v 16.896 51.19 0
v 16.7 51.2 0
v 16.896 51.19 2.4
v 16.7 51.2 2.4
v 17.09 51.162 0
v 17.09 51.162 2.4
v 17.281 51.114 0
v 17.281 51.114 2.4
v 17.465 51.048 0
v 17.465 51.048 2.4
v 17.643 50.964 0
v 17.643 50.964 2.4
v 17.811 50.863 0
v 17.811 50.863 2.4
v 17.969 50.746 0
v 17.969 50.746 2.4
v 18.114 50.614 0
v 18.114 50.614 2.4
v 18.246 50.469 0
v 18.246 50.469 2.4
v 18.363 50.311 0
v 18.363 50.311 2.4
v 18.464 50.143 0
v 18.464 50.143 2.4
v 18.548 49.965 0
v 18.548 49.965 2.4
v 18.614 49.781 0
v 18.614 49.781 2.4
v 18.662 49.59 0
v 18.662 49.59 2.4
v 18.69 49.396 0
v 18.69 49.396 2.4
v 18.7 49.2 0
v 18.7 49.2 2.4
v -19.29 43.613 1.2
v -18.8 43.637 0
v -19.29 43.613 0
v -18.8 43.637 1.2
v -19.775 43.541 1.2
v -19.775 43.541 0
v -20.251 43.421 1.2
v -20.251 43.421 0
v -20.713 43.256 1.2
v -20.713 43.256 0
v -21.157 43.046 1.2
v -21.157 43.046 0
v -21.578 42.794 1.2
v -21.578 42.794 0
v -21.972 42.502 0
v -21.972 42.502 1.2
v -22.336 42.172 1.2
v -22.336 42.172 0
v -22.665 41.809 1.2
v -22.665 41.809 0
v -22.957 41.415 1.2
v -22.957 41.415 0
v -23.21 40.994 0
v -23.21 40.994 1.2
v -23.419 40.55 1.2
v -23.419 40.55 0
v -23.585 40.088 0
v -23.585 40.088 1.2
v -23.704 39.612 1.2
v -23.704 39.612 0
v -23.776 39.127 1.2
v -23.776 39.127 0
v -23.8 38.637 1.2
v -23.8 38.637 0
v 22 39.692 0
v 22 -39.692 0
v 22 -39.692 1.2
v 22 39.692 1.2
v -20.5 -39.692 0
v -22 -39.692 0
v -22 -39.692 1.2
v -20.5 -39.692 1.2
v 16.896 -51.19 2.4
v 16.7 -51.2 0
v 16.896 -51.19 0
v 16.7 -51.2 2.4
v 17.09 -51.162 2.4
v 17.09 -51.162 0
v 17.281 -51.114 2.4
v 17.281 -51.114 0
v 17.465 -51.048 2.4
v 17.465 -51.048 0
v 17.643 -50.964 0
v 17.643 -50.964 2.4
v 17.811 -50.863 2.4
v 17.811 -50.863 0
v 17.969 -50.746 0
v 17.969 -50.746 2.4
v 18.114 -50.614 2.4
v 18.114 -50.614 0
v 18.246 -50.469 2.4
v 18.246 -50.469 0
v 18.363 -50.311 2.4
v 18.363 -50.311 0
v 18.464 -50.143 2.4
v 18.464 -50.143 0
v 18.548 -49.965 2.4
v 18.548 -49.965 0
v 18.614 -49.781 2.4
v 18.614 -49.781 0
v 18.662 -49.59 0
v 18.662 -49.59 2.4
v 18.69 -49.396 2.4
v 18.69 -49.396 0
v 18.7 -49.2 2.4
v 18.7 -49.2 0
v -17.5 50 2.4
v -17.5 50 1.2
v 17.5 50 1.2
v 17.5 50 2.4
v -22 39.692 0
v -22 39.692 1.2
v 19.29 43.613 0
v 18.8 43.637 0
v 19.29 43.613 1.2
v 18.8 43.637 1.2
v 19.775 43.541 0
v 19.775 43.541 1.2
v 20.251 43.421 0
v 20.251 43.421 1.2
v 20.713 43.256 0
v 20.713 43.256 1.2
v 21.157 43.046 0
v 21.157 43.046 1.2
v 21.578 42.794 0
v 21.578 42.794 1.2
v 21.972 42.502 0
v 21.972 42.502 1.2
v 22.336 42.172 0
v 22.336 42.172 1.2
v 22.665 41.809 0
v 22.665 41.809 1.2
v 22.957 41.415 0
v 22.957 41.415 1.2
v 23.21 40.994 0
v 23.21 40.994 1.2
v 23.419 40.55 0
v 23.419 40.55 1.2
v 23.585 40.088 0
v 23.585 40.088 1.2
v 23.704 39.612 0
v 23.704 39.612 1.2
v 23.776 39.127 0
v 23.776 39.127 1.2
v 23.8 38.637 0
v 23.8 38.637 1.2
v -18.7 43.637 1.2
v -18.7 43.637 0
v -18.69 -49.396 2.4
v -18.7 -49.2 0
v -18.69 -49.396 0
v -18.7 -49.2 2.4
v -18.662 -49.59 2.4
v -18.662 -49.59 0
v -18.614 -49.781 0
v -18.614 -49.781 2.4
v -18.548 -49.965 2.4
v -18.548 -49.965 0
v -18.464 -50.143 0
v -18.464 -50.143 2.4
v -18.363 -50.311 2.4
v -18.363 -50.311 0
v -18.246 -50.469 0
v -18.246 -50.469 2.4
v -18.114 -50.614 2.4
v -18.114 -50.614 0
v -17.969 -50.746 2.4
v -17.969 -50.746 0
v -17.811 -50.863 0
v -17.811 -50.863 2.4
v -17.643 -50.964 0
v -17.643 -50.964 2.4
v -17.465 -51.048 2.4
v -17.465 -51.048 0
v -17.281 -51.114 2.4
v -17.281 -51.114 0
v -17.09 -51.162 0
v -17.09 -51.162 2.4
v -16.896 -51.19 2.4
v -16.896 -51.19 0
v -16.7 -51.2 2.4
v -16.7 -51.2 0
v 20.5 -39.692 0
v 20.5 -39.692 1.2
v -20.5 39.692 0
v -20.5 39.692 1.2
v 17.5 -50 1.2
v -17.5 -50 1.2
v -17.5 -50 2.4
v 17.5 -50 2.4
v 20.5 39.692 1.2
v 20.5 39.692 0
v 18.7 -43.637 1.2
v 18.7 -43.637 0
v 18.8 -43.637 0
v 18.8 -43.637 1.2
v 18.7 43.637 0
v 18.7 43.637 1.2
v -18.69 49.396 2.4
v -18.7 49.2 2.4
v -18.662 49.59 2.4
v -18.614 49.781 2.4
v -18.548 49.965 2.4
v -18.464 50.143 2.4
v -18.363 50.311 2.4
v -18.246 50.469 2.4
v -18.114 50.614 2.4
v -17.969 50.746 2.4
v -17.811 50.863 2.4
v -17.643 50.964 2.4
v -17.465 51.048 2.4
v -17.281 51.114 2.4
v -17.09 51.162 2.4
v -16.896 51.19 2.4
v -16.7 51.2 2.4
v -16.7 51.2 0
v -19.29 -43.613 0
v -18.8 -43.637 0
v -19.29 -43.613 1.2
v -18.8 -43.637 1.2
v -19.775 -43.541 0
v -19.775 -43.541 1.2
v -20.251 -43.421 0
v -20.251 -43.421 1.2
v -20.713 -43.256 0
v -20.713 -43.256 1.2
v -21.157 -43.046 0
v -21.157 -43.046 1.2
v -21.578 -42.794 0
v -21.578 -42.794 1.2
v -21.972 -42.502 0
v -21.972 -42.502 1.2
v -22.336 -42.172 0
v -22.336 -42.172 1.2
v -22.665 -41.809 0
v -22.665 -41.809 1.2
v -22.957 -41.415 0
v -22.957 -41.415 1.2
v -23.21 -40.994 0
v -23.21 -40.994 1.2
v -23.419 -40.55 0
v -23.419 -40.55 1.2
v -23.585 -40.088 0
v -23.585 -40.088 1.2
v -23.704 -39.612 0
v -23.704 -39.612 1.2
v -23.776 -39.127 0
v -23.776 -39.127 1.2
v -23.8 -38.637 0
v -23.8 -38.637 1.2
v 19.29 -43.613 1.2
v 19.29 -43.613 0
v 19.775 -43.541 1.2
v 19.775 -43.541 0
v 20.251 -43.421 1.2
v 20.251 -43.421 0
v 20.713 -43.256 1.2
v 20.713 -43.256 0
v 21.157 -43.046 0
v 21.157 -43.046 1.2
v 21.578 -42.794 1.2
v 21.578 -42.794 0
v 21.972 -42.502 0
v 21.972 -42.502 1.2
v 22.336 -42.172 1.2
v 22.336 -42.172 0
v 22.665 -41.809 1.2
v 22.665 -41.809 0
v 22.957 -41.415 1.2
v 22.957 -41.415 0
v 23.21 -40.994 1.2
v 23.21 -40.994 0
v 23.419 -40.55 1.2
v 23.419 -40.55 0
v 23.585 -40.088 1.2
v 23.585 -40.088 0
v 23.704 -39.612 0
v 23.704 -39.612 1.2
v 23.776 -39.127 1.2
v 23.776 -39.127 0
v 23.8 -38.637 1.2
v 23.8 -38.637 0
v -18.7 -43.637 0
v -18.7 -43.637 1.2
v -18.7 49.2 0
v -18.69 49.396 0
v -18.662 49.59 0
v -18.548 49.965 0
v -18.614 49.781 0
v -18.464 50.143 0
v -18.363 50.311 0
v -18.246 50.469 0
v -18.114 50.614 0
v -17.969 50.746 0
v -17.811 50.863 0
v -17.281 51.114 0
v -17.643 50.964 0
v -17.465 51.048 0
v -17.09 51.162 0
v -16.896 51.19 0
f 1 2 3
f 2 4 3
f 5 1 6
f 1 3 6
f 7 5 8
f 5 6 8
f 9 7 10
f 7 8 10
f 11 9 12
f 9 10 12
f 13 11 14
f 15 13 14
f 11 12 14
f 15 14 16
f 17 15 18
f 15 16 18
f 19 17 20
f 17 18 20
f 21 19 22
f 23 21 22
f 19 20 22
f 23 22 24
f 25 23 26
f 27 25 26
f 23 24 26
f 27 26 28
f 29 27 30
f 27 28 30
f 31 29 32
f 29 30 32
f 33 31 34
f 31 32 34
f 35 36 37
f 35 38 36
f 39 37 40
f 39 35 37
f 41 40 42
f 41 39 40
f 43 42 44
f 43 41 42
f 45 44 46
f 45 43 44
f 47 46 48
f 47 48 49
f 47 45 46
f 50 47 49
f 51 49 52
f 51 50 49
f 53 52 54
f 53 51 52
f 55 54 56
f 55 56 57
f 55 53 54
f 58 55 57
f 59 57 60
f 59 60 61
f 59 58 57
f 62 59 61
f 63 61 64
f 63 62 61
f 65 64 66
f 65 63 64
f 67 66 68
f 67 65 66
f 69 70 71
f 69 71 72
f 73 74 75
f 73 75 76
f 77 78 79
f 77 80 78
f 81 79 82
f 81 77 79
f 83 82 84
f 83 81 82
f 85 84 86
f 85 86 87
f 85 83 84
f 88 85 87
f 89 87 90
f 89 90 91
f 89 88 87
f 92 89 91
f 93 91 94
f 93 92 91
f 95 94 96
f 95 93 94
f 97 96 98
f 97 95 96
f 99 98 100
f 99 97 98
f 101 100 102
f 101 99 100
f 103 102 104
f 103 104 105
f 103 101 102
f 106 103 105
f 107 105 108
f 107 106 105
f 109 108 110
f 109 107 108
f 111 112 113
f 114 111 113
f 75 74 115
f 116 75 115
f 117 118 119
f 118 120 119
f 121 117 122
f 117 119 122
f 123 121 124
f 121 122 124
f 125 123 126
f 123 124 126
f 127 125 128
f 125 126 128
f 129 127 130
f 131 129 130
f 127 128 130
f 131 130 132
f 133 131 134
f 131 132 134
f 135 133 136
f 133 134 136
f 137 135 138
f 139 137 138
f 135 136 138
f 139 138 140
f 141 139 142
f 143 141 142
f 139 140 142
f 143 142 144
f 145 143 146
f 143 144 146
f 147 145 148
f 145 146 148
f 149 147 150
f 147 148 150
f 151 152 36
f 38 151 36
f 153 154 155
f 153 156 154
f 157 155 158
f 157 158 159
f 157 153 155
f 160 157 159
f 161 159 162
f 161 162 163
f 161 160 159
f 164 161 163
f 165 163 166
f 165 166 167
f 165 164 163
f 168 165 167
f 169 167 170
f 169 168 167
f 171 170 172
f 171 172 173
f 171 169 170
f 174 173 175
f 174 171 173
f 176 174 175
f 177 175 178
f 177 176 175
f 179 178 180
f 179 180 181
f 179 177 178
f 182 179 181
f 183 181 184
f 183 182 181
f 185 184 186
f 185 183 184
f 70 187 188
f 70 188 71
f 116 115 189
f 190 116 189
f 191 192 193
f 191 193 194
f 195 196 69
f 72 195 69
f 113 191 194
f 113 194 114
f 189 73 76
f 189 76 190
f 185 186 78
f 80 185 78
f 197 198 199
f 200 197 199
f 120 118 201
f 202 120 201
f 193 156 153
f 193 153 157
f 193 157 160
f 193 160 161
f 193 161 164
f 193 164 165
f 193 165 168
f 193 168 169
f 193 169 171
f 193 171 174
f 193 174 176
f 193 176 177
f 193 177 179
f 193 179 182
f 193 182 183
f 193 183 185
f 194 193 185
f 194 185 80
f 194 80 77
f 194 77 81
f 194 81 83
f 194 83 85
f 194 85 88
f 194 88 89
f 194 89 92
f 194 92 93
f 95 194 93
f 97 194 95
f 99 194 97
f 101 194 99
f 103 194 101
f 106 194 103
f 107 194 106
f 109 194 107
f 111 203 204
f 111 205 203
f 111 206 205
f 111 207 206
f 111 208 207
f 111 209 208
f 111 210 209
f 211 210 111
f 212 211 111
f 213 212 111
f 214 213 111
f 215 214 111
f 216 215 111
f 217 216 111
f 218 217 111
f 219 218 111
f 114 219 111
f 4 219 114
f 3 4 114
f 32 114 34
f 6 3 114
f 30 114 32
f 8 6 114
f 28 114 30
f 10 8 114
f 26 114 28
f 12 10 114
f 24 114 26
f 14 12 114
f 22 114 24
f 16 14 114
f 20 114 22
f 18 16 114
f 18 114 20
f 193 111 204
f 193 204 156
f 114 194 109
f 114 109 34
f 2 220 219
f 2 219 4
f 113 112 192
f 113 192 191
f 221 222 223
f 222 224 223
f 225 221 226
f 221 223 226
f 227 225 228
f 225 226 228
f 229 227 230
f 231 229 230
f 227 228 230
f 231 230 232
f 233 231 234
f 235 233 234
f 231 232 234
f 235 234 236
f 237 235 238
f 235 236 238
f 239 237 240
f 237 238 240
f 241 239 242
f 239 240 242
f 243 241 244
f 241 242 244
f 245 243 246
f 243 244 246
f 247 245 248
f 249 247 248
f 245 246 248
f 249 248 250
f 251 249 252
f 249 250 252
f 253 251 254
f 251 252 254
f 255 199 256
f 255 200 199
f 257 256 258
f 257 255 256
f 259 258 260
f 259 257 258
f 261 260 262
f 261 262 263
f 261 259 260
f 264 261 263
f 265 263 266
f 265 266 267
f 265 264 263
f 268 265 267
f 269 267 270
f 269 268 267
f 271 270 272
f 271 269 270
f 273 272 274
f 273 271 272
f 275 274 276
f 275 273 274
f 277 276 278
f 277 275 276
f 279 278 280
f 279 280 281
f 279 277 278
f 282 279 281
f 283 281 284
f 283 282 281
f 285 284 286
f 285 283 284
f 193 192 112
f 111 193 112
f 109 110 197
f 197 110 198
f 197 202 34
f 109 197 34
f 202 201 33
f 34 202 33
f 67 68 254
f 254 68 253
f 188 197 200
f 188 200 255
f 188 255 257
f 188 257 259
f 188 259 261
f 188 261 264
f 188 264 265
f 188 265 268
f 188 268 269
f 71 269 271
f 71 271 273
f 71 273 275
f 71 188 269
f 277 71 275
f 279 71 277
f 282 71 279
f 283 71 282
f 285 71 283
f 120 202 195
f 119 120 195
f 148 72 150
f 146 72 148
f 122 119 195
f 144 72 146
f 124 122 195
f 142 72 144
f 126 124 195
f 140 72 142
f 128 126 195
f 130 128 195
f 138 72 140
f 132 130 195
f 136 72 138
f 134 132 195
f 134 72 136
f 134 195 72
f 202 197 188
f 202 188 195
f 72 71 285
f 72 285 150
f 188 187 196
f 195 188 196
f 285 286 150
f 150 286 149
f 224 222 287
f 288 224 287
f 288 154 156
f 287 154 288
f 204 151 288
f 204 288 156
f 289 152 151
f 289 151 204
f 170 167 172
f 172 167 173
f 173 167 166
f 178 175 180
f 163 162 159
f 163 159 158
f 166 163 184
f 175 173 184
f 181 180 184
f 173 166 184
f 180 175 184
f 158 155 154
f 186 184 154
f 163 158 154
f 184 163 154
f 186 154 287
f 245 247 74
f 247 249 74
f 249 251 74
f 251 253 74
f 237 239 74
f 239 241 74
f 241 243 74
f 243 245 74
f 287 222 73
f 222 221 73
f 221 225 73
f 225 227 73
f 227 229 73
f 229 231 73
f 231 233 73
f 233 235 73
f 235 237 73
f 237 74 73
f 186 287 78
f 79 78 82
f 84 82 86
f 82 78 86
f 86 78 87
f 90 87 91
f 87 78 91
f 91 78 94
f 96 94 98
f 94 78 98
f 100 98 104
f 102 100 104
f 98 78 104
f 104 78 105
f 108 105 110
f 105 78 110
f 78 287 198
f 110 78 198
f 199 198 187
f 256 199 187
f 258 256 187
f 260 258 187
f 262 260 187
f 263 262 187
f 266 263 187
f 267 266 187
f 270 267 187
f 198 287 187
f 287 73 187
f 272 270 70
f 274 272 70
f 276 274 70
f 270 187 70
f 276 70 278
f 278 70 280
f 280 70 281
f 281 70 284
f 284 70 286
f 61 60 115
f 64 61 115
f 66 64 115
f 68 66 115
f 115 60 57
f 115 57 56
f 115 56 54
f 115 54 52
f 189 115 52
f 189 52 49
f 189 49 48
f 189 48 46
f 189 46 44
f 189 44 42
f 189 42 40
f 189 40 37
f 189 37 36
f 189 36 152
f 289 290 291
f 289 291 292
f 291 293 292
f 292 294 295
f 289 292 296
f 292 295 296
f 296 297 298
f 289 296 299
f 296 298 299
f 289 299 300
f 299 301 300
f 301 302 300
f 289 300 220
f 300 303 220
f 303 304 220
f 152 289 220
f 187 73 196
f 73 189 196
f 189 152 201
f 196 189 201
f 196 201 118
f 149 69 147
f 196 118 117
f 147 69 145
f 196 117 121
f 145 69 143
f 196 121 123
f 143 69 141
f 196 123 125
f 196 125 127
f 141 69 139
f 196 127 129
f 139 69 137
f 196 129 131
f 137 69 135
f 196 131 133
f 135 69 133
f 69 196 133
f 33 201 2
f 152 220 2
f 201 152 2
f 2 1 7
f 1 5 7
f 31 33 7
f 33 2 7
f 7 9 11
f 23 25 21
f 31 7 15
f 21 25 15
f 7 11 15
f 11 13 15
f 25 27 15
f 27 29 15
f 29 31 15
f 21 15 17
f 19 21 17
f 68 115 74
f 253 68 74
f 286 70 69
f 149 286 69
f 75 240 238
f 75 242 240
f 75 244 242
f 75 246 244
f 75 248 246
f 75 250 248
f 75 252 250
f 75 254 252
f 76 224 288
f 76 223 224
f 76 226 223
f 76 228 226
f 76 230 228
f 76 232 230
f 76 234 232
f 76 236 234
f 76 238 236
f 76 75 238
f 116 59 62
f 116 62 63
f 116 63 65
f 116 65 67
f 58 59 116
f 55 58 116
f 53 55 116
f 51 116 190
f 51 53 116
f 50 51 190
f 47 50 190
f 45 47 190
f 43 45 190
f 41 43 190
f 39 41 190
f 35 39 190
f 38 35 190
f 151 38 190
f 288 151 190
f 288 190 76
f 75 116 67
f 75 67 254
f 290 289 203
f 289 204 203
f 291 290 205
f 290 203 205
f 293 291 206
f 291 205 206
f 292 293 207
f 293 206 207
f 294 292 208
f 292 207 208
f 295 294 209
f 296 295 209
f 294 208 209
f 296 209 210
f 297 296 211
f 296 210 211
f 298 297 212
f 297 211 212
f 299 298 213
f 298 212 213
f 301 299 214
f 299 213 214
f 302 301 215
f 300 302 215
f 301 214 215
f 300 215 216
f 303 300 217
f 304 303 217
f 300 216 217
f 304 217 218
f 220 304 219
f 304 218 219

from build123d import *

# Parameters (mm, degrees)
F1_W     = 35
F1_H     = 100
F2_DEPTH = 1.2
F1_W_2   = 37.4
F1_H_2   = 102.4
F3_DEPTH = 2.4
F4_R     = 2
F5_W     = 1.5
F5_H     = 79.3849229813
F6_DEPTH = 1.2
F7_R     = 5


with BuildPart() as f2:
    # F1 (on Top) → F2 (new body)
    with BuildSketch(Plane.XY):
        Rectangle(F1_W, F1_H)
    extrude(amount=F2_DEPTH)

    # F1 (on Top) → F3 (join)
    with BuildSketch(Plane.XY):
        Rectangle(F1_W_2, F1_H_2)
        Rectangle(F1_W, F1_H, mode=Mode.SUBTRACT)
    extrude(amount=F3_DEPTH)

    # F4
    f4_edges = [f2.edges().sort_by_distance(p)[0] for p in [
        (-18.7, -51.2, 1.2),
        (18.7, -51.2, 1.2),
        (18.7, 51.2, 1.2),
        (-18.7, 51.2, 1.2),
    ]]
    fillet(f4_edges, radius=F4_R)

    # F5 (on face) → F6 (join)
    with BuildSketch(Plane.XY):
        Polygon((-23.8, -43.636681512), (-18.7, -43.636681512), (-18.7, 43.636681512), (-23.8, 43.636681512), (-23.8, 0), align=None)
        with Locations((-21.25, 0)):
            Rectangle(F5_W, F5_H, mode=Mode.SUBTRACT)
        Polygon((23.8, -43.636681512), (23.8, 0), (23.8, 43.636681512), (18.7, 43.636681512), (18.7, -43.636681512), align=None)
        with Locations((21.25, 0)):
            Rectangle(F5_W, F5_H, mode=Mode.SUBTRACT)
    extrude(amount=F6_DEPTH)

    # F7
    f7_edges = [f2.edges().sort_by_distance(p)[0] for p in [
        (-23.8, 43.636682, 0.6),
        (23.8, 43.636682, 0.6),
        (23.8, -43.636682, 0.6),
        (-23.8, -43.636682, 0.6),
    ]]
    fillet(f7_edges, radius=F7_R)


solid = f2.part
